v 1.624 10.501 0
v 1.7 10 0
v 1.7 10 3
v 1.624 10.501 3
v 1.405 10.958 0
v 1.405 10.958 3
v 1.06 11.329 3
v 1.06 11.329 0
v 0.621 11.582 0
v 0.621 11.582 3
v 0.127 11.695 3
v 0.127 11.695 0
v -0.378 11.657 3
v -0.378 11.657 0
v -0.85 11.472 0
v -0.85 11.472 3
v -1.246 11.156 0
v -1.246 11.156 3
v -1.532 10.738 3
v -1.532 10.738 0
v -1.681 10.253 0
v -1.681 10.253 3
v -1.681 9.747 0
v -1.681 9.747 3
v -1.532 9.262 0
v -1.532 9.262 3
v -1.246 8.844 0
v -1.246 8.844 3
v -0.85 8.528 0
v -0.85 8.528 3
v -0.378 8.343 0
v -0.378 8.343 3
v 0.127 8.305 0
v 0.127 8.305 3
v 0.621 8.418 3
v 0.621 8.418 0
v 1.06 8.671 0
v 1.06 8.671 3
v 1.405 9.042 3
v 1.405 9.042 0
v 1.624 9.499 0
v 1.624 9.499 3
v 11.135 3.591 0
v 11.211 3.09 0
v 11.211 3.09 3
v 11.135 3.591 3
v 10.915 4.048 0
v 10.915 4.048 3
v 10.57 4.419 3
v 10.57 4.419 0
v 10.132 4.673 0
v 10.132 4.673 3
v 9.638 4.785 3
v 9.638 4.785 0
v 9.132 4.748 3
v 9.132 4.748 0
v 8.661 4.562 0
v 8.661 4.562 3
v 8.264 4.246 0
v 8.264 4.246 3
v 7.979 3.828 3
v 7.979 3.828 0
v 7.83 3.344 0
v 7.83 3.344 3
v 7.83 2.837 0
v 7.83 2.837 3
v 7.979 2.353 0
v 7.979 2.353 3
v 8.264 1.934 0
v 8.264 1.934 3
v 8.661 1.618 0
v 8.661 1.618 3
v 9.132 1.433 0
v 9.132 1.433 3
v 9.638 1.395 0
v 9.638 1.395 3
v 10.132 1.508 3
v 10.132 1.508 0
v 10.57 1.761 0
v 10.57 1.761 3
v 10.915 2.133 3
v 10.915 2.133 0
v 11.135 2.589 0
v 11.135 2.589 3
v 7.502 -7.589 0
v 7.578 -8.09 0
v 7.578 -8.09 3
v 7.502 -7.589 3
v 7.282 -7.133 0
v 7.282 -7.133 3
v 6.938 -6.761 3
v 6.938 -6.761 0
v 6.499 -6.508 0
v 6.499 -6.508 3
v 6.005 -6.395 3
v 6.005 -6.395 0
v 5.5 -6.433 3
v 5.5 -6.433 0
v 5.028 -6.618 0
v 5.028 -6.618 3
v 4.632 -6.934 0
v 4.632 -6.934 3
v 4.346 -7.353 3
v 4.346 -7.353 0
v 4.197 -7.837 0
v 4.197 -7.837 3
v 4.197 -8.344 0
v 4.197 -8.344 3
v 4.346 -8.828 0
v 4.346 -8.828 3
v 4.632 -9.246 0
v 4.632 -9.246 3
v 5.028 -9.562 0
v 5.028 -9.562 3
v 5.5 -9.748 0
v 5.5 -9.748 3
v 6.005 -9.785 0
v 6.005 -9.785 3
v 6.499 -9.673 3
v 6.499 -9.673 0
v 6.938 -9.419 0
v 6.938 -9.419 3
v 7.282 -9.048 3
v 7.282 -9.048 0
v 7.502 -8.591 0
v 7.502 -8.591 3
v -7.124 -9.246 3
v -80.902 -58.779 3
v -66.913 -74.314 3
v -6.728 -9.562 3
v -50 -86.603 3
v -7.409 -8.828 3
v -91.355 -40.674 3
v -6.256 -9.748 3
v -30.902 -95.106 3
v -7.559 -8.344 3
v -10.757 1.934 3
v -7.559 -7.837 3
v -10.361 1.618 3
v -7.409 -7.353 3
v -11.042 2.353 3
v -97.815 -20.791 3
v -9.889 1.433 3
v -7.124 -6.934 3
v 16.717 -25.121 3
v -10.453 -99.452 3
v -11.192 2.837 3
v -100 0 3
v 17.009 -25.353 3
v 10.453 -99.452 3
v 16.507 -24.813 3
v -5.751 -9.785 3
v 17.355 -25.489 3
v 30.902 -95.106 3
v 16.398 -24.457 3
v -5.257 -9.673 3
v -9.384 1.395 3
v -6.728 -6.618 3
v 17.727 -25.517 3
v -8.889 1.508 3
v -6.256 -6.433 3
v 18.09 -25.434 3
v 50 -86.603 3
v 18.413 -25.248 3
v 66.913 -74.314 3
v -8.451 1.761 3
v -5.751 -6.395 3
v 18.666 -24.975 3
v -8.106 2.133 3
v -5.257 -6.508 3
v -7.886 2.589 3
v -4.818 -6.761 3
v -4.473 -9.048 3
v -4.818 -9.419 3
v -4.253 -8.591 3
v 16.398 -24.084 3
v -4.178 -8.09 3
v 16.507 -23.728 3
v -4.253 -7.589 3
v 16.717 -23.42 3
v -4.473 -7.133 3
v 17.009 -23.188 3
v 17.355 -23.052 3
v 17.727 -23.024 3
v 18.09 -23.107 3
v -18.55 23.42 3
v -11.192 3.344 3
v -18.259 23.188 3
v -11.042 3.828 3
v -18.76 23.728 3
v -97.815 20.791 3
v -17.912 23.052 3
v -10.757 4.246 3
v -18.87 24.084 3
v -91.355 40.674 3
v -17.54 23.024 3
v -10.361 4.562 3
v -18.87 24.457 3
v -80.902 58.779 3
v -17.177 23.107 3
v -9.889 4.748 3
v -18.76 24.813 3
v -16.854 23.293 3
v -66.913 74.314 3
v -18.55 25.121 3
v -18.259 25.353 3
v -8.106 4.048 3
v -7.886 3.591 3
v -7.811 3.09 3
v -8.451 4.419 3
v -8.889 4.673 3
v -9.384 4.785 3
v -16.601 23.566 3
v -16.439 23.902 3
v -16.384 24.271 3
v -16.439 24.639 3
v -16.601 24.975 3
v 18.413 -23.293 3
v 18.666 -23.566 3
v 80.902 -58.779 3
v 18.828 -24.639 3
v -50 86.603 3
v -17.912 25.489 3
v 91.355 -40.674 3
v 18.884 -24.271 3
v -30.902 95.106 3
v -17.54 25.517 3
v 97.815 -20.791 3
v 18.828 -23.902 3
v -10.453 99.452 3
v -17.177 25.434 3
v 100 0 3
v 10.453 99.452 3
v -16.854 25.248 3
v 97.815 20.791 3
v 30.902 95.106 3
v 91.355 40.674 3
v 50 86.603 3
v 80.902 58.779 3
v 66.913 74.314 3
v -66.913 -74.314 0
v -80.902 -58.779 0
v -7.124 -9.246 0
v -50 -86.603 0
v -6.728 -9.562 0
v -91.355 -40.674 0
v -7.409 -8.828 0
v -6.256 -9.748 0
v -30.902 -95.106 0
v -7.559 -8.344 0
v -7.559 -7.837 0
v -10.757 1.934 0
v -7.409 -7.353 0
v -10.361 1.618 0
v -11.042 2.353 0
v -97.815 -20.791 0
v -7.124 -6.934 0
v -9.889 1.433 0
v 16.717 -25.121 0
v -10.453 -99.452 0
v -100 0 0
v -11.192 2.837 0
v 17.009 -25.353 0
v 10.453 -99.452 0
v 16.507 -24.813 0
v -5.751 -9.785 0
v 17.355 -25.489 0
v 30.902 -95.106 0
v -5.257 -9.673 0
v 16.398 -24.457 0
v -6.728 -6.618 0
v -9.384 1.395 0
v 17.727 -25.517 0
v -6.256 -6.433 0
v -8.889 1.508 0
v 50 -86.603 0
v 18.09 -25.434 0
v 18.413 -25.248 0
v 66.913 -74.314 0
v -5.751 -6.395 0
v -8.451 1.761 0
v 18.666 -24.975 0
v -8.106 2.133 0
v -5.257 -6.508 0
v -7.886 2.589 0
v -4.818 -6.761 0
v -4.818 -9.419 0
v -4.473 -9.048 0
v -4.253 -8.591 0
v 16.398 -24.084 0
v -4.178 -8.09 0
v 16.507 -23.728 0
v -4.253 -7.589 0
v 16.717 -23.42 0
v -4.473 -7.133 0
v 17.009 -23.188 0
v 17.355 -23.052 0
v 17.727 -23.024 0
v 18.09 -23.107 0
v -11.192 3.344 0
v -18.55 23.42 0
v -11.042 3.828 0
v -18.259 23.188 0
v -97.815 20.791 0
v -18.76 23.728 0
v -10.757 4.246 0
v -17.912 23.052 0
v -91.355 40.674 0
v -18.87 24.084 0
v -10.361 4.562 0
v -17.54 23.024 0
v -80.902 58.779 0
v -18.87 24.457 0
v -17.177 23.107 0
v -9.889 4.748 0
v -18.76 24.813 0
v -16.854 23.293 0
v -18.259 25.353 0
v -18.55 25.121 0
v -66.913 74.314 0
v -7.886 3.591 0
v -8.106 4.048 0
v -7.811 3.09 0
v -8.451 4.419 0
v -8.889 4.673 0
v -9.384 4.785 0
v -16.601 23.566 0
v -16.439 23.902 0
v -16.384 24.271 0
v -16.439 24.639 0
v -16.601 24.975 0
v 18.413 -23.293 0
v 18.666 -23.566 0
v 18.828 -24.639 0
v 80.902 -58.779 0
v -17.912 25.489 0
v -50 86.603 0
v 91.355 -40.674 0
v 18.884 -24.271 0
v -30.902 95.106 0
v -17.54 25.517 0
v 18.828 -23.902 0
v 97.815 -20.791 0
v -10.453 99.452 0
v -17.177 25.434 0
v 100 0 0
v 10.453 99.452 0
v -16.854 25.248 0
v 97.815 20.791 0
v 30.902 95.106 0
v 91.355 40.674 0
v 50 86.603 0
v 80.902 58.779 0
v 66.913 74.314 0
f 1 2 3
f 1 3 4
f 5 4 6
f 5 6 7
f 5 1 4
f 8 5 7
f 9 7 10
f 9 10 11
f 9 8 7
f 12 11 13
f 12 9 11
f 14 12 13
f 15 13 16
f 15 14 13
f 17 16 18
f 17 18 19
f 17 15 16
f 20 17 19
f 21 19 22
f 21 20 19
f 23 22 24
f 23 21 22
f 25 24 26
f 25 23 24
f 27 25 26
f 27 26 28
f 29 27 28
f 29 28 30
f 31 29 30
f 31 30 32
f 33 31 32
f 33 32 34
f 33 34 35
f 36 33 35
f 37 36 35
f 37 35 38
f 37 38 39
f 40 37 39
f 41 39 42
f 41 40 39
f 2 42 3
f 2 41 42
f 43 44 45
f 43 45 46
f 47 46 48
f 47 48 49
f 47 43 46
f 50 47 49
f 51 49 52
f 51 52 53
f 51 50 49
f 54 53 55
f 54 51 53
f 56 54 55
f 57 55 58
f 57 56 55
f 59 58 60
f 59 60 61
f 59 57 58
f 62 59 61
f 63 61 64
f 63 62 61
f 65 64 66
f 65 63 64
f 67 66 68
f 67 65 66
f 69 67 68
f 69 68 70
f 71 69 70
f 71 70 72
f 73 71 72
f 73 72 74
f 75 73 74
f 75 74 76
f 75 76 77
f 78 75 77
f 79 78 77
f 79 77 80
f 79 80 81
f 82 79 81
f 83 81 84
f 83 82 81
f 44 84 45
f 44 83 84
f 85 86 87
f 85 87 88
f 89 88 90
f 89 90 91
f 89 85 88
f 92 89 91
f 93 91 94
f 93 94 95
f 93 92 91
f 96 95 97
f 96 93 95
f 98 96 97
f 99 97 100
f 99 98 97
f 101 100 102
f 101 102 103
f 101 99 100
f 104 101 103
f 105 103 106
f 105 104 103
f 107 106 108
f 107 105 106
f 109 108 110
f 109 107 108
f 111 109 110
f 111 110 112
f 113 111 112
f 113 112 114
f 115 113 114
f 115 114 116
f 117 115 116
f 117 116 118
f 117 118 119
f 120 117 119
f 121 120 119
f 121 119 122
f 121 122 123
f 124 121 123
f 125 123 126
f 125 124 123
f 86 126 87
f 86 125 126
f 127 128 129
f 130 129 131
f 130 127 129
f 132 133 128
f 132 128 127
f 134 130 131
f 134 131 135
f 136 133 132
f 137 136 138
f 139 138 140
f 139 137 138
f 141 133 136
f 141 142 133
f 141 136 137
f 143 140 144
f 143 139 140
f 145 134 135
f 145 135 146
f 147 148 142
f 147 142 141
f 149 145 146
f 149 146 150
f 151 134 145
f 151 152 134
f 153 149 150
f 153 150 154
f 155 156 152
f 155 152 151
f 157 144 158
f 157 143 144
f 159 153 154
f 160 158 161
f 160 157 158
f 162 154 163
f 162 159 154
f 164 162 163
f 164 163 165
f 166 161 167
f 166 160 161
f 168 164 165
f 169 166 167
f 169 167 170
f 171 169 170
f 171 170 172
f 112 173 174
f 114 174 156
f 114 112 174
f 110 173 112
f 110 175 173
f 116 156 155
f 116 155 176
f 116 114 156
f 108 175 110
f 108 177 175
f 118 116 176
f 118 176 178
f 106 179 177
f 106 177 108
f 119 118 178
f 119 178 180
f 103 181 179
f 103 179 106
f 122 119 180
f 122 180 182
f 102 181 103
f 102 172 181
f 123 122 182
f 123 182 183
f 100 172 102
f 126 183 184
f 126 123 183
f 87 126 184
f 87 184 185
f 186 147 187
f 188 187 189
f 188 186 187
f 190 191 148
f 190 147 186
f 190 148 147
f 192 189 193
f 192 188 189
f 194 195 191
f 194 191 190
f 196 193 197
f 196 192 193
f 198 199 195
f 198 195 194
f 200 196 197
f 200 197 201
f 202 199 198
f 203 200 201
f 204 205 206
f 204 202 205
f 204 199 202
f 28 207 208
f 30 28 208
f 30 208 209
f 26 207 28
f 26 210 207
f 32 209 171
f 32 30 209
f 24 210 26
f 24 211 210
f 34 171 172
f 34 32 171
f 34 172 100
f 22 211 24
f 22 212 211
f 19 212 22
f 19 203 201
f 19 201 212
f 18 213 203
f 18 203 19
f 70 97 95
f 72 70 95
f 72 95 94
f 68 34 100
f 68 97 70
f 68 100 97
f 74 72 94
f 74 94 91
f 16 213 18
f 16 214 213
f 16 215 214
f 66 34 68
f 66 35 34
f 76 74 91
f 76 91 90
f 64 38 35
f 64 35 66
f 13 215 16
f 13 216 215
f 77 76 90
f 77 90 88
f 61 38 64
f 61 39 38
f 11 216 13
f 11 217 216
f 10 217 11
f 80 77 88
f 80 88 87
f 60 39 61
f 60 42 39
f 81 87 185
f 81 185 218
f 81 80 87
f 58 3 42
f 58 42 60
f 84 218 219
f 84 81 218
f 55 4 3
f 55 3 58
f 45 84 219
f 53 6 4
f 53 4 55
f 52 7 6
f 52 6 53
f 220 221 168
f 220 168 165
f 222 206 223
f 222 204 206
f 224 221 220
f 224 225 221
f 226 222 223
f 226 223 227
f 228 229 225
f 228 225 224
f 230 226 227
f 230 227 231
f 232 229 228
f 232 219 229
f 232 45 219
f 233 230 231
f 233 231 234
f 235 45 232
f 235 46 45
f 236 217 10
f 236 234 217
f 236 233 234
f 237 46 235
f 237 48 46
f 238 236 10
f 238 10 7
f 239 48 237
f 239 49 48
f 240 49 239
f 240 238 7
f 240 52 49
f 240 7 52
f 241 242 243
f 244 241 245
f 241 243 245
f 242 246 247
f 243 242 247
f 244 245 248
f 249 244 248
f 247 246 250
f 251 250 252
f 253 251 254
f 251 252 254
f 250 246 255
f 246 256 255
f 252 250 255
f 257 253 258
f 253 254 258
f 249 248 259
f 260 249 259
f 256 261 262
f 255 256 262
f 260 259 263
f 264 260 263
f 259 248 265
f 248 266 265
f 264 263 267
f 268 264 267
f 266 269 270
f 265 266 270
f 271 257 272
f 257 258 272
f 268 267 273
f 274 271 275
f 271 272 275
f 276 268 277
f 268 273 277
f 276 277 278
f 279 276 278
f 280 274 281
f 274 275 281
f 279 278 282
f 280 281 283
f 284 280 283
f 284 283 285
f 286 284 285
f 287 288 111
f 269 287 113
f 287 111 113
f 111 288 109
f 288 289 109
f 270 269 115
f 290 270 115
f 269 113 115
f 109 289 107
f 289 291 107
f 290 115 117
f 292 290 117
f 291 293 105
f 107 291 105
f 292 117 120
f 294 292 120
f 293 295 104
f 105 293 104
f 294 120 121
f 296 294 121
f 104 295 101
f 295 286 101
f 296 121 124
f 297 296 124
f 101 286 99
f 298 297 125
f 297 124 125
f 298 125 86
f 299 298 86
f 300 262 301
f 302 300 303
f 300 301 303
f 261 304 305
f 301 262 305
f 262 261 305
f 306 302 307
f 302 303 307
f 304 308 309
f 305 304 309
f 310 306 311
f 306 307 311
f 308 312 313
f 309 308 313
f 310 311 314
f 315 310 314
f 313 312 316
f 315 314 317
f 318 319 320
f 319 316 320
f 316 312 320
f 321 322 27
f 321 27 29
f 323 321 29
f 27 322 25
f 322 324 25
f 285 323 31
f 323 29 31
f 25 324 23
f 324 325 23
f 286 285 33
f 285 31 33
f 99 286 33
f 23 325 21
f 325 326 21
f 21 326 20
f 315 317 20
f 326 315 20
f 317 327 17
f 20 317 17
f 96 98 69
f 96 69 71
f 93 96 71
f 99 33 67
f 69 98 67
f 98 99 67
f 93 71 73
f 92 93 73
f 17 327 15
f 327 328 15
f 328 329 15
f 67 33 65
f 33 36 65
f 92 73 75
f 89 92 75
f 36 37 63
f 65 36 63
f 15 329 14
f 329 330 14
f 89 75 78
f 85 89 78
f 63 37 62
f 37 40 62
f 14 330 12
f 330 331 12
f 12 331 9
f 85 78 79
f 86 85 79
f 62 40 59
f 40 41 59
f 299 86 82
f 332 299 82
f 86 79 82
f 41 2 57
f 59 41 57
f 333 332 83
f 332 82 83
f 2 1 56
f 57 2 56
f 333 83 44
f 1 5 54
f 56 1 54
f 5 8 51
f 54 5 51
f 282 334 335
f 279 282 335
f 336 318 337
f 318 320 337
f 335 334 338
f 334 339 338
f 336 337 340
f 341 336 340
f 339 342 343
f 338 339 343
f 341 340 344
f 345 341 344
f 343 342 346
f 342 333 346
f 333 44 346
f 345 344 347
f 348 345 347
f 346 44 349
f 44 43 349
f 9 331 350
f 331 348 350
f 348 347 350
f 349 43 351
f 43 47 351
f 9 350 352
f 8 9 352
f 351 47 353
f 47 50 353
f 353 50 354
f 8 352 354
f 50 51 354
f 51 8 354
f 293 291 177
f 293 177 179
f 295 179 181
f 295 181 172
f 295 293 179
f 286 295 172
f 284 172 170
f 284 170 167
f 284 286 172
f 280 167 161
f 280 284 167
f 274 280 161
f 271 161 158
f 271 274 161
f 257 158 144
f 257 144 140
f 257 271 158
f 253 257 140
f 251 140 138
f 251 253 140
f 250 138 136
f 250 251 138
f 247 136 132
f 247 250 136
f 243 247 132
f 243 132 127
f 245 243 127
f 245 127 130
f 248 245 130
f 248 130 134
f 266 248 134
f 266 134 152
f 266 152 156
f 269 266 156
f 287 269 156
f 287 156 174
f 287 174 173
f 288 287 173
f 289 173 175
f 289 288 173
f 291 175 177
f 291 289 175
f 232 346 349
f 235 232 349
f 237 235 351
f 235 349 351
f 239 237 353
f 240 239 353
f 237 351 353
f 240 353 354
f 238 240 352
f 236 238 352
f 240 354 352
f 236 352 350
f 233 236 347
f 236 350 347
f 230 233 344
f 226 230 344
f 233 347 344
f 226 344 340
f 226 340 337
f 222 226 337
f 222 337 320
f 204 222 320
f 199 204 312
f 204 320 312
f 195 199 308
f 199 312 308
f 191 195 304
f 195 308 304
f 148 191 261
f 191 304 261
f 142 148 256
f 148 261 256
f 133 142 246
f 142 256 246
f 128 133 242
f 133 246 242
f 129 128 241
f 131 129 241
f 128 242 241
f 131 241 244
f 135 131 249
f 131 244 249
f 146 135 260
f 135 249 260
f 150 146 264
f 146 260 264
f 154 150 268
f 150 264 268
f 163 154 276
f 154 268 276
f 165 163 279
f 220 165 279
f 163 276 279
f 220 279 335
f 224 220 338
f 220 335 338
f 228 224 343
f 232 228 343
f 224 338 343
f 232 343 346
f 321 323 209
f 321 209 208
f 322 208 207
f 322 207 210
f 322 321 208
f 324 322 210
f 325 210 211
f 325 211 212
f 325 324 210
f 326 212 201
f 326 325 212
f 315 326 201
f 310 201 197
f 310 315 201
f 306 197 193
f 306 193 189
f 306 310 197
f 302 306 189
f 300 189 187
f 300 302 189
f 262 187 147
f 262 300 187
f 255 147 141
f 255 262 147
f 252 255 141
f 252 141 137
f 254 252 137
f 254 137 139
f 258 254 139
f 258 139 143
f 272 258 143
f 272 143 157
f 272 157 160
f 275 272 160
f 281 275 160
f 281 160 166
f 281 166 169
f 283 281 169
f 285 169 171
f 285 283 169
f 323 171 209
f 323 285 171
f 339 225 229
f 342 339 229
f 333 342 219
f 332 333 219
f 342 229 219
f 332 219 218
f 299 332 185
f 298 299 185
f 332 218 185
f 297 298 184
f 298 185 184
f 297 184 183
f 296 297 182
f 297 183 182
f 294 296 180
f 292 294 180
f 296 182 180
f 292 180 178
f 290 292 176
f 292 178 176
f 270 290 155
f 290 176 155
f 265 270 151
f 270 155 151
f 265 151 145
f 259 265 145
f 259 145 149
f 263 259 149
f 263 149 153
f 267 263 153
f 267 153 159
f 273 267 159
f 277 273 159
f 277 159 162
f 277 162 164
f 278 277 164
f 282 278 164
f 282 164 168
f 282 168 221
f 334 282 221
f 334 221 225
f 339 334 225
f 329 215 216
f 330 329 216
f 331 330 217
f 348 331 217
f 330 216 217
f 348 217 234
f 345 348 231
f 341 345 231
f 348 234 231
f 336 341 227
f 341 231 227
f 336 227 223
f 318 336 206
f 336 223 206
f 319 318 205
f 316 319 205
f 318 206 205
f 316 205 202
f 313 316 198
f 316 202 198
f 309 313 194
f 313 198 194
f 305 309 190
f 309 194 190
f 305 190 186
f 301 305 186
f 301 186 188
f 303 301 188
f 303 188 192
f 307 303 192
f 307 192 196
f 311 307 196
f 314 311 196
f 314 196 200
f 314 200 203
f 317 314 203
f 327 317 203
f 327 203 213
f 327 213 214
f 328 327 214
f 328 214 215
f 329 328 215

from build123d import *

# Parameters (mm, degrees)
ESQUISSE1_R              = 100
BOSS_EXTRU_1_DEPTH       = 3
D_GAGEMENT_M31_OUTLINE_R = 1.7
D_GAGEMENT_M31_DEPTH     = 3
ENL_V_MAT_EXTRU_1_REACH  = 143.453
ESQUISSE5_R              = 1.25


# Read off the part's stored shape, not the designer's step: Dégagement M31
with BuildPart() as part:
    # Esquisse1 → Boss.-Extru.1 (new body)
    with BuildSketch(Plane.XY):
        Circle(ESQUISSE1_R)
    extrude(amount=BOSS_EXTRU_1_DEPTH)

    # Dégagement M31 outline → Dégagement M31 (cut)
    with BuildSketch(Plane.XY):
        with Locations((9.510565163, 3.090169944)):
            Circle(D_GAGEMENT_M31_OUTLINE_R)
        with Locations((5.877852523, -8.090169944)):
            Circle(D_GAGEMENT_M31_OUTLINE_R)
        with Locations((-5.877852523, -8.090169944)):
            Circle(D_GAGEMENT_M31_OUTLINE_R)
        with Locations((-9.510565163, 3.090169944)):
            Circle(D_GAGEMENT_M31_OUTLINE_R)
        with Locations((0, 10)):
            Circle(D_GAGEMENT_M31_OUTLINE_R)
    extrude(amount=D_GAGEMENT_M31_DEPTH, mode=Mode.SUBTRACT)

    # Esquisse5 → Enlèv. mat.-Extru.1 (cut, up to next)
    with BuildSketch(Plane.XY.offset(3), mode=Mode.PRIVATE) as enl_v_mat_extru_1_sk1:
        with Locations((17.633557569, -24.270509831)):
            Circle(ESQUISSE5_R)
    enl_v_mat_extru_1_tool1 = extrude(enl_v_mat_extru_1_sk1.sketch, amount=-ENL_V_MAT_EXTRU_1_REACH, mode=Mode.PRIVATE) & part.part
    # Esquisse5 → Enlèv. mat.-Extru.1 (cut, up to next)
    with BuildSketch(Plane.XY.offset(3), mode=Mode.PRIVATE) as enl_v_mat_extru_1_sk2:
        with Locations((-17.633557569, 24.270509831)):
            Circle(ESQUISSE5_R)
    enl_v_mat_extru_1_tool2 = extrude(enl_v_mat_extru_1_sk2.sketch, amount=-ENL_V_MAT_EXTRU_1_REACH, mode=Mode.PRIVATE) & part.part
    add(enl_v_mat_extru_1_tool1.solids().sort_by_distance((17.633558, -24.27051, 3))[0], mode=Mode.SUBTRACT)
    add(enl_v_mat_extru_1_tool2.solids().sort_by_distance((-17.633558, 24.27051, 3))[0], mode=Mode.SUBTRACT)


solid = part.part
